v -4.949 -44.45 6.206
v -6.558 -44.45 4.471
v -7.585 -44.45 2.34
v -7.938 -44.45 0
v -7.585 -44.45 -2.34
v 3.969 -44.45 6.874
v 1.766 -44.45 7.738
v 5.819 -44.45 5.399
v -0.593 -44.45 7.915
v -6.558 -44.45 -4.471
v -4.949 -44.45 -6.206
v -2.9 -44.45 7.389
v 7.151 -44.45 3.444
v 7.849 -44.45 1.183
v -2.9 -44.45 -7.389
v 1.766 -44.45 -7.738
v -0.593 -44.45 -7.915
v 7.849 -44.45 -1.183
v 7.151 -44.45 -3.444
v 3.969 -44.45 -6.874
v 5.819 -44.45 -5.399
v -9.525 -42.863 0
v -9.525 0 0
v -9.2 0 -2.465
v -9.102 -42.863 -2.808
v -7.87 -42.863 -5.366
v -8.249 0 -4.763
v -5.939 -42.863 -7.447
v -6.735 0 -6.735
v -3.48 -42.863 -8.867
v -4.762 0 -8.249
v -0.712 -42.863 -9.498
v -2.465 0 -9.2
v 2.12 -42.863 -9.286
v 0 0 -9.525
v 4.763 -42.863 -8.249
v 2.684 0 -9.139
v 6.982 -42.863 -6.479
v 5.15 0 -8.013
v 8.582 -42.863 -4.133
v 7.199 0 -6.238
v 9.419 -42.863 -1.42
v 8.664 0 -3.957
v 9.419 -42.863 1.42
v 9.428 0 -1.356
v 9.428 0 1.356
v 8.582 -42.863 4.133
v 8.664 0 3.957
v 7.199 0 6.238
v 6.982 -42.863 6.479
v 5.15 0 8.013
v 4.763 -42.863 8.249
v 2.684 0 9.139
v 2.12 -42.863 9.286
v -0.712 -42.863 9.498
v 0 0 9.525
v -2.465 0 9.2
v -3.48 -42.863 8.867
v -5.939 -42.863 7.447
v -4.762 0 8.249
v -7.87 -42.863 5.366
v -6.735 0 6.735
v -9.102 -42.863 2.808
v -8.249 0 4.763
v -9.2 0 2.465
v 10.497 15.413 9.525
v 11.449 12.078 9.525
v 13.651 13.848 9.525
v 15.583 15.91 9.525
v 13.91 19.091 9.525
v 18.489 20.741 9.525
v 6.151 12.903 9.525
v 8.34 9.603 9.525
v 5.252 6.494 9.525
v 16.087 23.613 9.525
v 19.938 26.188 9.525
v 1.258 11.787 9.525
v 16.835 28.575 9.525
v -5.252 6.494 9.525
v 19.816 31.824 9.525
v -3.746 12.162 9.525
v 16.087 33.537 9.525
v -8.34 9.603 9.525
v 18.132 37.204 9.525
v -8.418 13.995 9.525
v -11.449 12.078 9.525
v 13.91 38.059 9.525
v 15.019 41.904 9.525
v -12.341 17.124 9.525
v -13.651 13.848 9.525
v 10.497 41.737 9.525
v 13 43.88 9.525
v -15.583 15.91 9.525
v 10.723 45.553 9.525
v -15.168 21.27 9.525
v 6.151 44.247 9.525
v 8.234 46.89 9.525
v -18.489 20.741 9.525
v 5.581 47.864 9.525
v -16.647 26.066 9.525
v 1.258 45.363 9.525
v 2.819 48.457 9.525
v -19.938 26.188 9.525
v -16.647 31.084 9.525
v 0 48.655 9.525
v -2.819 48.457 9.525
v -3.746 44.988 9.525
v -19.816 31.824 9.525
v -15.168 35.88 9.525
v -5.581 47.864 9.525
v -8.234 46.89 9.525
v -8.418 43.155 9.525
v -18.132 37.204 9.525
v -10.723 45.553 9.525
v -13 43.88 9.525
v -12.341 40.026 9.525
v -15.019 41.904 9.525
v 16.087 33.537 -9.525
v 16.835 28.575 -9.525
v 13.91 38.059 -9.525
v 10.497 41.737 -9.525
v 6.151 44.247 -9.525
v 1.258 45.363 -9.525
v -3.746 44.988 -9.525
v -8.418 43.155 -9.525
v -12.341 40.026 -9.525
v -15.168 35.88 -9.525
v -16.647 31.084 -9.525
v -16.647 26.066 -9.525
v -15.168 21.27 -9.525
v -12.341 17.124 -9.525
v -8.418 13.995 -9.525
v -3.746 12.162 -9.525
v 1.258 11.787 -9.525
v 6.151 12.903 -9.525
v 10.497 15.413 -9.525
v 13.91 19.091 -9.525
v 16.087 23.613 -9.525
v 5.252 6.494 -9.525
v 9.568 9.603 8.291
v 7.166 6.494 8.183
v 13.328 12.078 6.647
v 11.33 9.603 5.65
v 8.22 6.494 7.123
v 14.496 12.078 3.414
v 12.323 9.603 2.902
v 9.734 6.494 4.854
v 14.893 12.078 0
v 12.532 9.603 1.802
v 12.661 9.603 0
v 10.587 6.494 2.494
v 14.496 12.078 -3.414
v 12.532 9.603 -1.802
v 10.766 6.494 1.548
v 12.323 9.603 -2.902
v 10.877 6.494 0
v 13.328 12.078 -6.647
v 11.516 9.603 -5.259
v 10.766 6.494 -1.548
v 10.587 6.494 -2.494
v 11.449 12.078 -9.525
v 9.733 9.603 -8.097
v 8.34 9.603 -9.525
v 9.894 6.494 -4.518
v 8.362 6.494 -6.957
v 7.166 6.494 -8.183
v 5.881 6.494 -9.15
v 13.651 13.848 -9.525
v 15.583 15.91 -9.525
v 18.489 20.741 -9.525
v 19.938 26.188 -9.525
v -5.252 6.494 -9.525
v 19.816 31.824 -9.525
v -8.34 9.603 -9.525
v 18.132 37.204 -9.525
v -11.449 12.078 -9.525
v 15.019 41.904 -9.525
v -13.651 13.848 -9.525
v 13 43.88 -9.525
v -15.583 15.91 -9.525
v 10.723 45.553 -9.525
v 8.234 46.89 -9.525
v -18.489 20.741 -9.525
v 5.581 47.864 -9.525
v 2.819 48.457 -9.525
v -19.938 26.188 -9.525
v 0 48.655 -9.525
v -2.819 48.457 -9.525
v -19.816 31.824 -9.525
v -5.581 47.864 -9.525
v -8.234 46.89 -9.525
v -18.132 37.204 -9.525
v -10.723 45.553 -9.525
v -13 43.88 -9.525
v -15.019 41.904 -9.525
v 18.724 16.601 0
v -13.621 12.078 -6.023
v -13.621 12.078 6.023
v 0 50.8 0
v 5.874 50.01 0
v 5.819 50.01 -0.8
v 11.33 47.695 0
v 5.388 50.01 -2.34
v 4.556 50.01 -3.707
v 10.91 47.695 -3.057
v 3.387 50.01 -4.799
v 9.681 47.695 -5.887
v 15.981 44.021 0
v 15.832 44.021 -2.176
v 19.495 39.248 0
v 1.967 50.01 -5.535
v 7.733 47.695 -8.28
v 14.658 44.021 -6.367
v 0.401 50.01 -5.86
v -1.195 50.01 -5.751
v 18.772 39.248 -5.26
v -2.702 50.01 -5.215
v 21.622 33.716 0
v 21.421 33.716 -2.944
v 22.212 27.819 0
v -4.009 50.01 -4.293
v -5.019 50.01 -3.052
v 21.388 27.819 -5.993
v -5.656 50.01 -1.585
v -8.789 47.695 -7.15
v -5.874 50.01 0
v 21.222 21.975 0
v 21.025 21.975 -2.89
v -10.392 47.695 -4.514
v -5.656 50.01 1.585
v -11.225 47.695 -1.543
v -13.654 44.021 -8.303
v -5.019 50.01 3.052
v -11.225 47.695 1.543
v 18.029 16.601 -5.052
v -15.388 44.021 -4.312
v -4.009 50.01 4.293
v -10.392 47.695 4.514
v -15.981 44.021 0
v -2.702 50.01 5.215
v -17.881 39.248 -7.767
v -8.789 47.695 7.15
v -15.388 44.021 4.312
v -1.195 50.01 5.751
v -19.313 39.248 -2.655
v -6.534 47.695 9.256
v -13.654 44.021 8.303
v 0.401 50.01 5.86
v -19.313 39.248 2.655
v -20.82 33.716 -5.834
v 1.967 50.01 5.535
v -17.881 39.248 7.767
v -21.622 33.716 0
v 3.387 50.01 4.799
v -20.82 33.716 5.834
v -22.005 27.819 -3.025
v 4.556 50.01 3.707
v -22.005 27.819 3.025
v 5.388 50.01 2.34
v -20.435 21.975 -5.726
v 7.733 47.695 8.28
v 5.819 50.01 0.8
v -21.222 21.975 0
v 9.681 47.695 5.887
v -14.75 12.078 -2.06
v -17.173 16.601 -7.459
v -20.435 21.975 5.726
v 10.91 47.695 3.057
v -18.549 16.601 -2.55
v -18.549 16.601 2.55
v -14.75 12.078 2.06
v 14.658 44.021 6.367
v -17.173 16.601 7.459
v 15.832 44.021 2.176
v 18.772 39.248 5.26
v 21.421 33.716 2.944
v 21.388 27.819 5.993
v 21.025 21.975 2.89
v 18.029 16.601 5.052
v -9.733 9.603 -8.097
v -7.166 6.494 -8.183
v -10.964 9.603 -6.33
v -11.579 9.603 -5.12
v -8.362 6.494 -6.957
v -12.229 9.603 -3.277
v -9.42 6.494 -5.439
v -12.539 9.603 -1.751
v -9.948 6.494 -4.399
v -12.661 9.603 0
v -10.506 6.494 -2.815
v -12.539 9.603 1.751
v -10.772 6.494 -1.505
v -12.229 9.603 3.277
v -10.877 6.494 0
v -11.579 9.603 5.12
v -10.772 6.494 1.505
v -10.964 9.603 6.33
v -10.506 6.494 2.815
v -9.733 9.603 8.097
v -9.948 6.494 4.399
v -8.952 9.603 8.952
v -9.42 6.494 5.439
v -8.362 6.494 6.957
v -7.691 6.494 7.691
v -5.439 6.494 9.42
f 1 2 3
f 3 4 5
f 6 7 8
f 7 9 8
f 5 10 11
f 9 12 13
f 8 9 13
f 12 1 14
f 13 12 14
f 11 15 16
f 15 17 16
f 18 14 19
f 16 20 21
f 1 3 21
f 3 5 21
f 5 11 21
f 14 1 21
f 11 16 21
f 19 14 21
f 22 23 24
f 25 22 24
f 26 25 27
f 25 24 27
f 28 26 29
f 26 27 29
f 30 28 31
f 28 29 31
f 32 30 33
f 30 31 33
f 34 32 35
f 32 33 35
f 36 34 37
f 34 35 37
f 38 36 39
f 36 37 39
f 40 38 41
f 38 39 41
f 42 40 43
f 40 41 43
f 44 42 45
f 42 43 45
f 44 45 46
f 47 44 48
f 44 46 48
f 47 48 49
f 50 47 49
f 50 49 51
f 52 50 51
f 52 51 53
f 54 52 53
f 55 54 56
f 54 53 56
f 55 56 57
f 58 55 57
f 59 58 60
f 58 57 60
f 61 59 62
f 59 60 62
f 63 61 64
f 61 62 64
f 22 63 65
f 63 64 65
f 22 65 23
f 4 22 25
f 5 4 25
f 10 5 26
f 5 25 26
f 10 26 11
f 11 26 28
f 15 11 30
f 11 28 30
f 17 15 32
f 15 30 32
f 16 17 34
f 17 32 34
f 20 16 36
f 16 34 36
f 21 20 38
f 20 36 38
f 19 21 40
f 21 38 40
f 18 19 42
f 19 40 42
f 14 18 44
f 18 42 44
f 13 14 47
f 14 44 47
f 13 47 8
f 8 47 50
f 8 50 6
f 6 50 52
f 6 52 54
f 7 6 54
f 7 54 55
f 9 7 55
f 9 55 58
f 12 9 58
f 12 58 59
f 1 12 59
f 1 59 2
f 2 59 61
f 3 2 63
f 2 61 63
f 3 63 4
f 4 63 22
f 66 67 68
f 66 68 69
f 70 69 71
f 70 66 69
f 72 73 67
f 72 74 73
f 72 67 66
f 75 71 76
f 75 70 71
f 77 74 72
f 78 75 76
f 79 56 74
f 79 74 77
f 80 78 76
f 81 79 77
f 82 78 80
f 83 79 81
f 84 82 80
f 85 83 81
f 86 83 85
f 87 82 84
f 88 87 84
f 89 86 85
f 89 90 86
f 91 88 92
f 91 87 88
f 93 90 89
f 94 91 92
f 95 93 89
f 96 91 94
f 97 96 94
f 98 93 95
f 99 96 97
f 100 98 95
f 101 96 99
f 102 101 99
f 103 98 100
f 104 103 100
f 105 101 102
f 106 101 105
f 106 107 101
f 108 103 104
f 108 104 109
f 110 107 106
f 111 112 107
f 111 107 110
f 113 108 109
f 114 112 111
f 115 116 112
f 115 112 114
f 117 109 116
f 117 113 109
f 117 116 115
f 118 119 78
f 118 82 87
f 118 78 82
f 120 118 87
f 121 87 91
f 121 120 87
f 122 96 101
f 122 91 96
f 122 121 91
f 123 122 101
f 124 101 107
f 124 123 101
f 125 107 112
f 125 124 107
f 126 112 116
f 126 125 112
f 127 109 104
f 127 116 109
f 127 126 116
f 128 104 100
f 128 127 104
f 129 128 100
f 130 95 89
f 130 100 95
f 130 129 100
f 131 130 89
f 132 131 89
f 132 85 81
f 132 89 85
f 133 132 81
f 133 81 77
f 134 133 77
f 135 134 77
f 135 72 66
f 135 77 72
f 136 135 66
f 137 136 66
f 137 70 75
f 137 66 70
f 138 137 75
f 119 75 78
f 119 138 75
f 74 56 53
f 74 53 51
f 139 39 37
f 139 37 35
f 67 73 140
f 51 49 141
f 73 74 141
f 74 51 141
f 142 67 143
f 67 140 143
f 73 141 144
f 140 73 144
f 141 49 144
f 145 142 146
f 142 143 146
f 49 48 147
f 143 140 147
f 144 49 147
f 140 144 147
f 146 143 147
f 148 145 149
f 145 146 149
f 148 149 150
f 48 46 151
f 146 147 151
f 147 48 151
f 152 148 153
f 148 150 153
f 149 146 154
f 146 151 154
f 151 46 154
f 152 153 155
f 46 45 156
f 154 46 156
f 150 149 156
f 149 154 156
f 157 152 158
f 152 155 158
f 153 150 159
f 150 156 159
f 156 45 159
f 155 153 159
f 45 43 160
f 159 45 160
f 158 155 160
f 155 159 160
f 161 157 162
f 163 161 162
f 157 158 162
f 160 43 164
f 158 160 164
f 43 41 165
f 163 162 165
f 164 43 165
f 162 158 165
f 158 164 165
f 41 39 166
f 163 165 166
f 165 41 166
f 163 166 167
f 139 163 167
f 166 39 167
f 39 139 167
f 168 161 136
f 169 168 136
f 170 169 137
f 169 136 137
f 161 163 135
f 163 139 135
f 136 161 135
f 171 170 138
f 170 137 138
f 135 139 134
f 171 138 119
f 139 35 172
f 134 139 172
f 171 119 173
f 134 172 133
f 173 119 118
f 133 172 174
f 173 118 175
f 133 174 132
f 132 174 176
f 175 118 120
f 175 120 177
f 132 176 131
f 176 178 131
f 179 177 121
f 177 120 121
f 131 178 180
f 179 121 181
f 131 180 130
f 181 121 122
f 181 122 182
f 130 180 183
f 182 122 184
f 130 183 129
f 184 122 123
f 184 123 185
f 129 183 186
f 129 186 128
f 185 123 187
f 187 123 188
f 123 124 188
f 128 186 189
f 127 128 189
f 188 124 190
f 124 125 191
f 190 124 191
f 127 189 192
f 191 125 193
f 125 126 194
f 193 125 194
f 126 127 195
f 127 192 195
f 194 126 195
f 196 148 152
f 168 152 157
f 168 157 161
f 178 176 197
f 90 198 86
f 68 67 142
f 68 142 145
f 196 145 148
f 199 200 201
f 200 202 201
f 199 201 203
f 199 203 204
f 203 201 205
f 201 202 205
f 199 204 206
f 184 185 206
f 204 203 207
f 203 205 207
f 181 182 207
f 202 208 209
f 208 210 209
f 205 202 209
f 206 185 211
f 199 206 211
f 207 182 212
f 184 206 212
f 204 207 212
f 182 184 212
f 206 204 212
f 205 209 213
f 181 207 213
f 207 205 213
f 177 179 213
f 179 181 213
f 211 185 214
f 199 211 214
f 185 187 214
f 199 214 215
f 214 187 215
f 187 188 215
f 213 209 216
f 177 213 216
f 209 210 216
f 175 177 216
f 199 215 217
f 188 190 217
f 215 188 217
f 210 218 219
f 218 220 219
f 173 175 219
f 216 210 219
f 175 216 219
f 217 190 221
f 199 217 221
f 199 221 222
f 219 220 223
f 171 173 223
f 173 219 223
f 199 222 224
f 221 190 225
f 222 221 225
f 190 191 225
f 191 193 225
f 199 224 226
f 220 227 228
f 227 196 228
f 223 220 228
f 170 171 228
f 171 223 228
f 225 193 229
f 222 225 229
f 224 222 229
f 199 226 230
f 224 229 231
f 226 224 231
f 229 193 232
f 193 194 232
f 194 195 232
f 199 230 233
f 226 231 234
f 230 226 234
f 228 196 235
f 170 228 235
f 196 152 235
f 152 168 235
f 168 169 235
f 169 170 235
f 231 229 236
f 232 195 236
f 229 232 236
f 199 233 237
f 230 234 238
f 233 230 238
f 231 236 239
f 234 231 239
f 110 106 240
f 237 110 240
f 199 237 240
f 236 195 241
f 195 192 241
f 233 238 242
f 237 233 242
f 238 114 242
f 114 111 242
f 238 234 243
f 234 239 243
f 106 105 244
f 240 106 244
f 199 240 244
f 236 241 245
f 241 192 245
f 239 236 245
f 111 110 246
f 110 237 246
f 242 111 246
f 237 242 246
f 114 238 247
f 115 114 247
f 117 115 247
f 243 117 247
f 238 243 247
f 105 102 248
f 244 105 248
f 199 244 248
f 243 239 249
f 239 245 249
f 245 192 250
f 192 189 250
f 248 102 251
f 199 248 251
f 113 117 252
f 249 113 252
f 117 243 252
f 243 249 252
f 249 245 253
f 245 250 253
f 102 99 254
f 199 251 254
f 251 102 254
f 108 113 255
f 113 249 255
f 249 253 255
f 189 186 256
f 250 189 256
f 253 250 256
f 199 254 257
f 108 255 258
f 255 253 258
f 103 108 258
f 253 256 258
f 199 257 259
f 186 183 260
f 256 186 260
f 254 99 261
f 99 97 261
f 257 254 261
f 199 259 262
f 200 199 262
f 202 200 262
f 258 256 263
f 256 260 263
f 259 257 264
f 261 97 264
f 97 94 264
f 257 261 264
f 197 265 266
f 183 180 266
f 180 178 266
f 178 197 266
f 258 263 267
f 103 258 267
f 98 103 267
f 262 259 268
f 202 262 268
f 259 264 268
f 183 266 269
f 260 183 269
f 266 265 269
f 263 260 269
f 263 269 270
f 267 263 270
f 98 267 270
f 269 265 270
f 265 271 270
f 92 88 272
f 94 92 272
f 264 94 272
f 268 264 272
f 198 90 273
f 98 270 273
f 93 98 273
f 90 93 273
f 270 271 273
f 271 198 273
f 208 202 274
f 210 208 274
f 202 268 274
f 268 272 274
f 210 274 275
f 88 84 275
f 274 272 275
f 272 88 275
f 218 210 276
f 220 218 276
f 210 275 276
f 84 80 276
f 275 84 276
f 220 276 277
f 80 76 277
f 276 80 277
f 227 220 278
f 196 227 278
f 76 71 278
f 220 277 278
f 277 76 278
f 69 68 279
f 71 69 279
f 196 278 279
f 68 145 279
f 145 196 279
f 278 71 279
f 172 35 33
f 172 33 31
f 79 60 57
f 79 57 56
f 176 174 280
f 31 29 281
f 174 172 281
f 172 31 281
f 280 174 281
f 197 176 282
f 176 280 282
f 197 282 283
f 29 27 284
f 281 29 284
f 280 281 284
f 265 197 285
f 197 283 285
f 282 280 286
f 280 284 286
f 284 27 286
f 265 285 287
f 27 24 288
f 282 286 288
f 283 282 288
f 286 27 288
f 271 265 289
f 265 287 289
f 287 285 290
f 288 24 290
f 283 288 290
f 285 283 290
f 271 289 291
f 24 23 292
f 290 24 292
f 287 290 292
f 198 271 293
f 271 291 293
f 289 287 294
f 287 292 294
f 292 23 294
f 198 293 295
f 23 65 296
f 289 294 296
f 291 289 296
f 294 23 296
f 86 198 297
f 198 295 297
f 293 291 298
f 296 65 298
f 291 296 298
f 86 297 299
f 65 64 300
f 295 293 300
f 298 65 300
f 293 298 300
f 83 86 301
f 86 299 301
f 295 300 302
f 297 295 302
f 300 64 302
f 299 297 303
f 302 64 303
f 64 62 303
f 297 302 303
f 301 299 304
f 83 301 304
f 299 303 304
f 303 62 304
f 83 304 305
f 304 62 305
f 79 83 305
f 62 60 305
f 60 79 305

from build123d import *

# Parameters (mm, degrees)
SKETCH1_W               = 9.525
SKETCH1_H               = 44.45
CHAMFER2_SIZE           = 1.5875
CUT_EXTRUDE1_DEPTH      = 60.737268518
CUT_EXTRUDE1_DEPTH_BACK = 60.737268518
SKETCH5_W               = 12.7
SKETCH5_H               = 50.8
CUT_EXTRUDE2_DEPTH      = 57.261143358
CUT_EXTRUDE2_DEPTH_BACK = 57.261143358
SKETCH6_R               = 16.8354375
CUT_EXTRUDE3_DEPTH      = 58.900240514
CUT_EXTRUDE3_DEPTH_BACK = 58.900240514
SKETCH8_W               = 11.1125
SKETCH8_H               = 50.8
CUT_EXTRUDE4_DEPTH      = 58.900240514
CUT_EXTRUDE4_DEPTH_BACK = 58.900240514
SKETCH10_R              = 9.525
CHAMFER1_SIZE           = 0.9525


with BuildPart() as part:
    # Sketch1 → Revolve1 (revolve)
    with BuildSketch(Plane.XY, mode=Mode.PRIVATE) as revolve1_sk:
        with Locations((4.7625, -22.225)):
            Rectangle(SKETCH1_W, SKETCH1_H)
    revolve(revolve1_sk.sketch.rotate(Axis((0, 50.8, 0), (0, -1, 0)), 180), axis=Axis((0, 50.8, 0), (0, -1, 0)))

    # Chamfer2
    chamfer2_edges = [part.edges().sort_by_distance(p)[0] for p in [
        (9.525, -44.45, 0),
    ]]
    chamfer(chamfer2_edges, length=CHAMFER2_SIZE)

    # Sketch4 → Revolve2 (revolve)
    with BuildSketch(Plane.XY):
        with BuildLine():
            Line((9.525, 0), (0, 0))
            Line((0, 0), (0, 50.8))
            ThreePointArc((0, 50.8), (20.743606098, 36.553310038), (14.893041237, 12.078092784))
            ThreePointArc((14.893041237, 12.078092784), (10.927447707, 6.608634352), (9.525, 0))
        make_face()
    revolve(axis=Axis((0, 50.8, 0), (0, 1, 0)))

    # Sketch5 → Cut-Extrude1 (cut, two sides: drawn at the far end of the back side and taken through both)
    with BuildSketch(Plane(origin=(0, 0, 0), x_dir=(0, 0, -1), z_dir=(1, 0, 0)).offset(-CUT_EXTRUDE1_DEPTH_BACK)):
        with Locations((15.875, 25.4)):
            Rectangle(SKETCH5_W, SKETCH5_H)
        with Locations((-15.875, 25.4)):
            Rectangle(SKETCH5_W, SKETCH5_H)
    extrude(amount=CUT_EXTRUDE1_DEPTH + CUT_EXTRUDE1_DEPTH_BACK, mode=Mode.SUBTRACT)

    # Sketch6 → Cut-Extrude2 (cut, two sides: drawn at the far end of the back side and taken through both)
    with BuildSketch(Plane.XY.offset(-CUT_EXTRUDE2_DEPTH_BACK)):
        with Locations((0, 28.575)):
            Circle(SKETCH6_R)
    extrude(amount=CUT_EXTRUDE2_DEPTH + CUT_EXTRUDE2_DEPTH_BACK, mode=Mode.SUBTRACT)


with BuildPart() as body_2:
    # Sketch7 → Revolve3 (revolve)
    with BuildSketch(Plane.XY):
        with BuildLine():
            Line((0, 45.24375), (0, 11.90625))
            ThreePointArc((0, 11.90625), (16.66875, 28.575), (0, 45.24375))
        make_face()
    revolve(axis=Axis((0, 0, 0), (0, 1, 0)))

    # Sketch8 → Cut-Extrude3 (cut, two sides: drawn at the far end of the back side and taken through both)
    with BuildSketch(Plane(origin=(0, 0, 0), x_dir=(0, 0, -1), z_dir=(1, 0, 0)).offset(-CUT_EXTRUDE3_DEPTH_BACK)):
        with Locations((-16.66875, 25.4)):
            Rectangle(SKETCH8_W, SKETCH8_H)
        with Locations((16.66875, 25.4)):
            Rectangle(SKETCH8_W, SKETCH8_H)
    extrude(amount=CUT_EXTRUDE3_DEPTH + CUT_EXTRUDE3_DEPTH_BACK, mode=Mode.SUBTRACT)

    # Sketch10 → Cut-Extrude4 (cut, two sides: drawn at the far end of the back side and taken through both)
    with BuildSketch(Plane.XY.offset(-CUT_EXTRUDE4_DEPTH_BACK)):
        with Locations((0, 28.575)):
            Circle(SKETCH10_R)
    extrude(amount=CUT_EXTRUDE4_DEPTH + CUT_EXTRUDE4_DEPTH_BACK, mode=Mode.SUBTRACT)

    # Chamfer1
    chamfer1_edges = [body_2.edges().sort_by_distance(p)[0] for p in [
        (-9.525, 28.575, -11.1125),
        (-9.525, 28.575, 11.1125),
    ]]
    chamfer(chamfer1_edges, length=CHAMFER1_SIZE)


solid = part.part
